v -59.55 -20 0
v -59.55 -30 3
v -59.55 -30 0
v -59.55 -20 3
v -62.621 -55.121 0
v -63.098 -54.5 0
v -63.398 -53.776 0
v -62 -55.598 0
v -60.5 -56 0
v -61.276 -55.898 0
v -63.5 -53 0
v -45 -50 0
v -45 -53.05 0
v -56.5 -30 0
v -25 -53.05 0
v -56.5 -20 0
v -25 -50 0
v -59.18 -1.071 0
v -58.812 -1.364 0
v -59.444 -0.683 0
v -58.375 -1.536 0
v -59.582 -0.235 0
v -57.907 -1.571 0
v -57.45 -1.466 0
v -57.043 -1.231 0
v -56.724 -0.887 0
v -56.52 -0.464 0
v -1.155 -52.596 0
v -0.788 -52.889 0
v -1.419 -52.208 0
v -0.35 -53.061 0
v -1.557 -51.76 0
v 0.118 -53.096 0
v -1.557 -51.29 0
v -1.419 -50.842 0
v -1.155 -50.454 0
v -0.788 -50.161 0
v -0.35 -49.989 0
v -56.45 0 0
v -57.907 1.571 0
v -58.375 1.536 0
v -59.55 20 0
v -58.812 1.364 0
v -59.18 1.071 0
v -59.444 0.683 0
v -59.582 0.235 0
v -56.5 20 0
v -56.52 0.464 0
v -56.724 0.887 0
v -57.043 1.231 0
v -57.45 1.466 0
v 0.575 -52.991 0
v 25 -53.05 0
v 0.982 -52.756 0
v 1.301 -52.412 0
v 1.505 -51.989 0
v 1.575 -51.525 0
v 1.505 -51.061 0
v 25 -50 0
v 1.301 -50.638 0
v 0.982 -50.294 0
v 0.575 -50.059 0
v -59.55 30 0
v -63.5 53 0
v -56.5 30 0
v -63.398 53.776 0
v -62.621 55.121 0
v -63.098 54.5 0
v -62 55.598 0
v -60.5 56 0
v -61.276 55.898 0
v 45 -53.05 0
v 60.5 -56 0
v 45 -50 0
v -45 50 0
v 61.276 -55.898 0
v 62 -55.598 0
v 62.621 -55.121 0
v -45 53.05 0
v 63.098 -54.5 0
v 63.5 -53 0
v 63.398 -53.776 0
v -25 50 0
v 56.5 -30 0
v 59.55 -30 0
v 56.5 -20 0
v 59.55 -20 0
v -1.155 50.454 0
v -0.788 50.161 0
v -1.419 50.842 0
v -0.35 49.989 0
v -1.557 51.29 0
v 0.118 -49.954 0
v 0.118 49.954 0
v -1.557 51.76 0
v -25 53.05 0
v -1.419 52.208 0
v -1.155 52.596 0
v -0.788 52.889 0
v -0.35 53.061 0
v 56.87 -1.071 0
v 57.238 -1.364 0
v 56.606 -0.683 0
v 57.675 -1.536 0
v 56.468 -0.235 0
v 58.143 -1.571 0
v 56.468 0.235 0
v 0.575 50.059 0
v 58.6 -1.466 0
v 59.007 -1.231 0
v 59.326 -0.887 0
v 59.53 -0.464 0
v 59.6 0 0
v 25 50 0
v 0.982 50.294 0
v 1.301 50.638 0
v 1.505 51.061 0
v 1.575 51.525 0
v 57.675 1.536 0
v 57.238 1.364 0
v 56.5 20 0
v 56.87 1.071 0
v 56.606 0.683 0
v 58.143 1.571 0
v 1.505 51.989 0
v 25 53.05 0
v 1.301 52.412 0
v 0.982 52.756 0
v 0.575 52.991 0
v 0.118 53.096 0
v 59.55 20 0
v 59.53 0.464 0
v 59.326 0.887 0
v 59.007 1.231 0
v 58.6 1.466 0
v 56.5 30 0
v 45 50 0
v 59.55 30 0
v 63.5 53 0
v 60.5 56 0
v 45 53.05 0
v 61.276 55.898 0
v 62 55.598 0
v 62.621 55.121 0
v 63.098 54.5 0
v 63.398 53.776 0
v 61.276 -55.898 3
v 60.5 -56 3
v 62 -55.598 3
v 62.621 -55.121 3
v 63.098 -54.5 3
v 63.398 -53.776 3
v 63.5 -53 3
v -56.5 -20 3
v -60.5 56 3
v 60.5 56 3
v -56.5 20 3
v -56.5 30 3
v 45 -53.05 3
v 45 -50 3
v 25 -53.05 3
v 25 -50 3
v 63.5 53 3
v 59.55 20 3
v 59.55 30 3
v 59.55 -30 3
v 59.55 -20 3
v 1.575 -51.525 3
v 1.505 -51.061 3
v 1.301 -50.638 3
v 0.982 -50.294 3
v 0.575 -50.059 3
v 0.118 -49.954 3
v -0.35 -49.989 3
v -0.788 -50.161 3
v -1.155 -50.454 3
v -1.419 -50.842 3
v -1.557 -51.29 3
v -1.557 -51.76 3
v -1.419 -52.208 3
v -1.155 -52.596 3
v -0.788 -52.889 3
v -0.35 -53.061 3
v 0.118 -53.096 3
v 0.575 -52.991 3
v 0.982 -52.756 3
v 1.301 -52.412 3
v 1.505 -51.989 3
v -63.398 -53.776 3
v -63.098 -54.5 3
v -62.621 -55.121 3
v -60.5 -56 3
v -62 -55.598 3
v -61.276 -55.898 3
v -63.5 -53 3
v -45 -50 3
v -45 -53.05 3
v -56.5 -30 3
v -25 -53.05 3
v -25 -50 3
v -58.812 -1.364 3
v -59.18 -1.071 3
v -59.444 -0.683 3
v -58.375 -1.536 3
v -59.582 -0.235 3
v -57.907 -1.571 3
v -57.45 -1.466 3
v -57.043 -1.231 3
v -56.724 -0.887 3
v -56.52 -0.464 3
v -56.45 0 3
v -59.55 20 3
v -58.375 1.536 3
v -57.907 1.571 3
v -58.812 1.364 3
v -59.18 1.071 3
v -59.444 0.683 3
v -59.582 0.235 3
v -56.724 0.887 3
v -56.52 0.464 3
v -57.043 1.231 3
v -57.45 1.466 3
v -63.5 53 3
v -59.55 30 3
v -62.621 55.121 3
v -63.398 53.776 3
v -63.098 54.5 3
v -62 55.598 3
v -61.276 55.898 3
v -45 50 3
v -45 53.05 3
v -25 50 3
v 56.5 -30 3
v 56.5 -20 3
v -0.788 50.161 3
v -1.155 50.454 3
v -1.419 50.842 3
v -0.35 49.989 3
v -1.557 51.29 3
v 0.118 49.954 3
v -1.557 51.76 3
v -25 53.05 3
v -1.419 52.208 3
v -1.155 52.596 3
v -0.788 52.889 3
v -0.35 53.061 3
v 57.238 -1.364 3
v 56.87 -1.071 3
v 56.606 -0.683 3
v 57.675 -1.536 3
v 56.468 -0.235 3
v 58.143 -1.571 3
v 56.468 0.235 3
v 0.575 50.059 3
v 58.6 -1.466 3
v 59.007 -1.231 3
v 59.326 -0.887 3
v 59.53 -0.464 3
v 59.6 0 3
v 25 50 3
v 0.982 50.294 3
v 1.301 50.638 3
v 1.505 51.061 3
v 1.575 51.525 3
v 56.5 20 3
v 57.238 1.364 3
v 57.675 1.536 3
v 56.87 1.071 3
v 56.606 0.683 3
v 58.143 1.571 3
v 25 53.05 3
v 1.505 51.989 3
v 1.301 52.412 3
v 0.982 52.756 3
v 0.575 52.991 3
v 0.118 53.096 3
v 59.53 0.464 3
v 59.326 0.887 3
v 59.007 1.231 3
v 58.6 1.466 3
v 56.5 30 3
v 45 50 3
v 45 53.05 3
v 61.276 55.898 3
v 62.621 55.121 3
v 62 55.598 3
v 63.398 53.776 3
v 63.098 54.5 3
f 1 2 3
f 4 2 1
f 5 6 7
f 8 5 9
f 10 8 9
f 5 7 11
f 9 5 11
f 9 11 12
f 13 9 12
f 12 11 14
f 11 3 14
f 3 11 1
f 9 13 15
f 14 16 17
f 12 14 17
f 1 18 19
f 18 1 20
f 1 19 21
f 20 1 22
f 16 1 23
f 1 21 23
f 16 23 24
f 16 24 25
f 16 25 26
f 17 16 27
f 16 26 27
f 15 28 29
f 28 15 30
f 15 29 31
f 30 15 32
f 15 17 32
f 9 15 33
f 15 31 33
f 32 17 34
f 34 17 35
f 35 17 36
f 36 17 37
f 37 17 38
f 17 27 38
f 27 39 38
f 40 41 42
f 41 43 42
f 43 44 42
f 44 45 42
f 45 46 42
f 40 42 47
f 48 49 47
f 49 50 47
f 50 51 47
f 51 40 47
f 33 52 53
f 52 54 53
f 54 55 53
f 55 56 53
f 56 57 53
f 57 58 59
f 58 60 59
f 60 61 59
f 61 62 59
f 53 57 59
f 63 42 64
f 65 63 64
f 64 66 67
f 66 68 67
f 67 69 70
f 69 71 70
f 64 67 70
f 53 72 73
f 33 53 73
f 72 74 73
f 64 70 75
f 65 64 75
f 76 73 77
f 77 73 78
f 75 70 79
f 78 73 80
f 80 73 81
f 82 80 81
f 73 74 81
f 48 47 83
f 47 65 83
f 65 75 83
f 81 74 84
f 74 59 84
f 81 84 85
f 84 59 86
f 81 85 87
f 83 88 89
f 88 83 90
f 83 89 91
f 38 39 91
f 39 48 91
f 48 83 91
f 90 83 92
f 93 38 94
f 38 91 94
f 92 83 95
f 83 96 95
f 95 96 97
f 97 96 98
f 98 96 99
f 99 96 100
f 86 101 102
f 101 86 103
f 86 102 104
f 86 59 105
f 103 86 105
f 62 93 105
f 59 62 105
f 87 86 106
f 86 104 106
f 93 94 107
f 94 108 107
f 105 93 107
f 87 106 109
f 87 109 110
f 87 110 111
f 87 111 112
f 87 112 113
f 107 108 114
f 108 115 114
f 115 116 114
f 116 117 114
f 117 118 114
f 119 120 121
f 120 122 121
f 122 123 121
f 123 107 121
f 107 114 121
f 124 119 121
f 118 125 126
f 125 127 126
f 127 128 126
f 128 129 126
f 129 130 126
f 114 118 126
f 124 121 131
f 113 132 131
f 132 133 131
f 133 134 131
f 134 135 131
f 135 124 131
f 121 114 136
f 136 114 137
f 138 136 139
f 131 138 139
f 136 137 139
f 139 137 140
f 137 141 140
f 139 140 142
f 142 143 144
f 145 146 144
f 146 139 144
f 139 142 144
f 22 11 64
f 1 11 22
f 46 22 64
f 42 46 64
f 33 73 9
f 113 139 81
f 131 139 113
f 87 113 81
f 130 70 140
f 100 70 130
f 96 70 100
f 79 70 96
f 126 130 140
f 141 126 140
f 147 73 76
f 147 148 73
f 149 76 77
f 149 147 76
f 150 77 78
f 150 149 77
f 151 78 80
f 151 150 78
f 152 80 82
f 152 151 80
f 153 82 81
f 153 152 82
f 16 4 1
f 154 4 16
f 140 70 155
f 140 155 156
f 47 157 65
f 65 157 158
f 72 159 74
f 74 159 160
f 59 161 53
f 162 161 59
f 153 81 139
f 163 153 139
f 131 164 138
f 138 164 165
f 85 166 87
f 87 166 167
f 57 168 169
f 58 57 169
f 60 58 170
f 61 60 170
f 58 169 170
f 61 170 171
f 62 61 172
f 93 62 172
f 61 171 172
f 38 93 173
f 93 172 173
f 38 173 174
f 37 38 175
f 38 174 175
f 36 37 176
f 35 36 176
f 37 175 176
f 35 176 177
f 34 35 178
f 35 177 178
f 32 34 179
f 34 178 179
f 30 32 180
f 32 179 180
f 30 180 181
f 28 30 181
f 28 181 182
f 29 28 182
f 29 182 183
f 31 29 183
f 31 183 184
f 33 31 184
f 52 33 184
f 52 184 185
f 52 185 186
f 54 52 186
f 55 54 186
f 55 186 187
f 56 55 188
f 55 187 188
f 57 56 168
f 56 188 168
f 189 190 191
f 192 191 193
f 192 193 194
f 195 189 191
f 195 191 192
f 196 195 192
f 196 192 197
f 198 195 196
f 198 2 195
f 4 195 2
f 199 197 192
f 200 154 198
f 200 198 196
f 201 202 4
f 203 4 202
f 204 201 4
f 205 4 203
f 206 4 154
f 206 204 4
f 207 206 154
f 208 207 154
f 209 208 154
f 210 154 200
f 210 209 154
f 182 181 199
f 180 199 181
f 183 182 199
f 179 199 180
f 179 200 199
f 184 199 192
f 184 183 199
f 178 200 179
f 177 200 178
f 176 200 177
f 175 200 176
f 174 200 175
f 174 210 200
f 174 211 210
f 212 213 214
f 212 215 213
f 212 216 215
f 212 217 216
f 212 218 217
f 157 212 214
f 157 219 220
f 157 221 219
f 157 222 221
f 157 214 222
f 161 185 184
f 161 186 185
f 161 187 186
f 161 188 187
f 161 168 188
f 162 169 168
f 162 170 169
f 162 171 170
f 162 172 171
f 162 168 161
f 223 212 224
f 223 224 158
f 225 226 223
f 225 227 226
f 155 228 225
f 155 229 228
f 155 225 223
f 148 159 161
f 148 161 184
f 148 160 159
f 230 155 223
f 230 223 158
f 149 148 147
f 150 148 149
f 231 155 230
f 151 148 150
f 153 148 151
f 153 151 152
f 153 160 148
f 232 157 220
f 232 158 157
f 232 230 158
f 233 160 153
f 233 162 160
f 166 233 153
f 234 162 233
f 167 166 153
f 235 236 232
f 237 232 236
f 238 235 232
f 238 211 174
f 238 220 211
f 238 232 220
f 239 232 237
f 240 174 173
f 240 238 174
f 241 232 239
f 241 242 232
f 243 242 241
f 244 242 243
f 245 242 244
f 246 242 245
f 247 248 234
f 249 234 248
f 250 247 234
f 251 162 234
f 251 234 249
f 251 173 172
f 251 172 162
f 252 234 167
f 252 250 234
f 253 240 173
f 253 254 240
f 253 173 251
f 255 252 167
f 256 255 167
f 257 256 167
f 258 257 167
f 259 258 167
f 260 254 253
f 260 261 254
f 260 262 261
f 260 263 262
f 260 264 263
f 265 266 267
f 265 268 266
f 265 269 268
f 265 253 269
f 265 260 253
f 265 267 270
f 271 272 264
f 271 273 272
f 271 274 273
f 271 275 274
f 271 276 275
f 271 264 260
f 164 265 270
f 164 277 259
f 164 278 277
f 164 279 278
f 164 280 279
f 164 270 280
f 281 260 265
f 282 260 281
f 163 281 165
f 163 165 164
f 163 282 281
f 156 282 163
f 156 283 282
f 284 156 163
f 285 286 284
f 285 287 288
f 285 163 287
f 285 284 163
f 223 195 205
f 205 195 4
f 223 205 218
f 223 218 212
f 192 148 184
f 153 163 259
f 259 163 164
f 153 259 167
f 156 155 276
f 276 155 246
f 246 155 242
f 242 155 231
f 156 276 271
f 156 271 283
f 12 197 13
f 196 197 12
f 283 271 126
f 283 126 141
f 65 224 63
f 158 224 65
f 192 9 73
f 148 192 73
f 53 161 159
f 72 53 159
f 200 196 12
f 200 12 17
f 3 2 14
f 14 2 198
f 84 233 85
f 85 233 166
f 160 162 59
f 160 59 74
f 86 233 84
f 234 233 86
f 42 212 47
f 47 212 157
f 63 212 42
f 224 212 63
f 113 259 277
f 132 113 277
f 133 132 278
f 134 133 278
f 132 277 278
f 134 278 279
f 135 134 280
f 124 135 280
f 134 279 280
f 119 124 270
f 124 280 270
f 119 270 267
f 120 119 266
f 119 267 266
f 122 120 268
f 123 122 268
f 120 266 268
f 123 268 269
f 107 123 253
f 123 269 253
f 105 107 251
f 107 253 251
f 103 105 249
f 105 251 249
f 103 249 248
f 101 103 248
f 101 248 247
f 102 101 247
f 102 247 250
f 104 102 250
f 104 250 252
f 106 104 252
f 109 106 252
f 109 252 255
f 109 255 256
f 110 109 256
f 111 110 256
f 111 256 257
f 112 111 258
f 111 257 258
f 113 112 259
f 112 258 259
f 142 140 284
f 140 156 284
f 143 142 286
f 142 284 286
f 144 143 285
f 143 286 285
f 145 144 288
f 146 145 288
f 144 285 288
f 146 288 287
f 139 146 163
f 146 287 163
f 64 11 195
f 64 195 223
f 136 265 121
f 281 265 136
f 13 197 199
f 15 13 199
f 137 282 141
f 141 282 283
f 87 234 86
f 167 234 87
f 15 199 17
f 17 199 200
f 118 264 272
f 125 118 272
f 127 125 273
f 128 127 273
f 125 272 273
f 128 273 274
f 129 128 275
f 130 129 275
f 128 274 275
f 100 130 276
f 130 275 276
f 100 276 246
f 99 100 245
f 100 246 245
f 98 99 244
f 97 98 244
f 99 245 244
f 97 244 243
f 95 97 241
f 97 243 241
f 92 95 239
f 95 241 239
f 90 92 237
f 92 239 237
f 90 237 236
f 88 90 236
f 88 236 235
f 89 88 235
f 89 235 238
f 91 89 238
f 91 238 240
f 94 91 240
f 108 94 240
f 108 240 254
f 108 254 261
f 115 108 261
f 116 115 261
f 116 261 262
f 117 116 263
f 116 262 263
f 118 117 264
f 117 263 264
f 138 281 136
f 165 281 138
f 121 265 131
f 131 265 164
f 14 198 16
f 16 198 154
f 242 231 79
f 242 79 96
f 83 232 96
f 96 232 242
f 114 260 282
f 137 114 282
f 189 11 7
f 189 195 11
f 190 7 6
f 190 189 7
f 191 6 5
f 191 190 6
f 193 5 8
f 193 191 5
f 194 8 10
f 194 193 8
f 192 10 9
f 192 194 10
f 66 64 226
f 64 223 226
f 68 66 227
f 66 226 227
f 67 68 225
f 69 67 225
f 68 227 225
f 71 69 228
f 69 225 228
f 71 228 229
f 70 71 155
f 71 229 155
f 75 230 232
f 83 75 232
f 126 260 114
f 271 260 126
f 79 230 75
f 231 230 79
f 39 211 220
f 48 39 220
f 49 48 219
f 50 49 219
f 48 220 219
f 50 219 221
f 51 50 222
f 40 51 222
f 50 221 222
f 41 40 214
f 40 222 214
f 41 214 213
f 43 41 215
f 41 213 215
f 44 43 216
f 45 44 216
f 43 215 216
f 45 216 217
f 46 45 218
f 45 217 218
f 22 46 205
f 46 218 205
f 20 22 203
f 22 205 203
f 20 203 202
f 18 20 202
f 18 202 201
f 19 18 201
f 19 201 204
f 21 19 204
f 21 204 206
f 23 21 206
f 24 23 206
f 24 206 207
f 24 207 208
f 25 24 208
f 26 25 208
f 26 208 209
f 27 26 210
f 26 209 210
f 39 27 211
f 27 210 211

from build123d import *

# Parameters (mm, degrees)
F0_W     = 127
F0_H     = 112
F1_DEPTH = 3
F2_W     = 3.05
F2_H     = 10
F2_R     = 1.575
F2_W_2   = 20
F2_H_2   = 3.05
F3_DEPTH = 3
F4_R     = 3


with BuildPart() as f1:
    # F0 (on Top) → F1 (new body)
    with BuildSketch(Plane.XY):
        Rectangle(F0_W, F0_H)
    extrude(amount=F1_DEPTH)

    # F2 (on face) → F3 (cut, through all)
    with BuildSketch(Plane.XY.offset(3)):
        with Locations((-58.025, 25)):
            Rectangle(F2_W, F2_H)
        with Locations((-58.025, -25)):
            Rectangle(F2_W, F2_H)
        with Locations((-58.025, 0)):
            Circle(F2_R)
        with Locations((58.025, -25)):
            Rectangle(F2_W, F2_H)
        with Locations((58.025, 25)):
            Rectangle(F2_W, F2_H)
        with Locations((58.025, 0)):
            Circle(F2_R)
        with Locations((-35, -51.525)):
            Rectangle(F2_W_2, F2_H_2)
        with Locations((35, -51.525)):
            Rectangle(F2_W_2, F2_H_2)
        with Locations((0, -51.525)):
            Circle(F2_R)
        with Locations((-35, 51.525)):
            Rectangle(F2_W_2, F2_H_2)
        with Locations((35, 51.525)):
            Rectangle(F2_W_2, F2_H_2)
        with Locations((0, 51.525)):
            Circle(F2_R)
    extrude(amount=-F3_DEPTH, mode=Mode.SUBTRACT)

    # F4
    f4_edges = [f1.edges().sort_by_distance(p)[0] for p in [
        (63.5, -56, 1.5),
        (-63.5, -56, 1.5),
        (-63.5, 56, 1.5),
        (63.5, 56, 1.5),
    ]]
    fillet(f4_edges, radius=F4_R)


solid = f1.part
